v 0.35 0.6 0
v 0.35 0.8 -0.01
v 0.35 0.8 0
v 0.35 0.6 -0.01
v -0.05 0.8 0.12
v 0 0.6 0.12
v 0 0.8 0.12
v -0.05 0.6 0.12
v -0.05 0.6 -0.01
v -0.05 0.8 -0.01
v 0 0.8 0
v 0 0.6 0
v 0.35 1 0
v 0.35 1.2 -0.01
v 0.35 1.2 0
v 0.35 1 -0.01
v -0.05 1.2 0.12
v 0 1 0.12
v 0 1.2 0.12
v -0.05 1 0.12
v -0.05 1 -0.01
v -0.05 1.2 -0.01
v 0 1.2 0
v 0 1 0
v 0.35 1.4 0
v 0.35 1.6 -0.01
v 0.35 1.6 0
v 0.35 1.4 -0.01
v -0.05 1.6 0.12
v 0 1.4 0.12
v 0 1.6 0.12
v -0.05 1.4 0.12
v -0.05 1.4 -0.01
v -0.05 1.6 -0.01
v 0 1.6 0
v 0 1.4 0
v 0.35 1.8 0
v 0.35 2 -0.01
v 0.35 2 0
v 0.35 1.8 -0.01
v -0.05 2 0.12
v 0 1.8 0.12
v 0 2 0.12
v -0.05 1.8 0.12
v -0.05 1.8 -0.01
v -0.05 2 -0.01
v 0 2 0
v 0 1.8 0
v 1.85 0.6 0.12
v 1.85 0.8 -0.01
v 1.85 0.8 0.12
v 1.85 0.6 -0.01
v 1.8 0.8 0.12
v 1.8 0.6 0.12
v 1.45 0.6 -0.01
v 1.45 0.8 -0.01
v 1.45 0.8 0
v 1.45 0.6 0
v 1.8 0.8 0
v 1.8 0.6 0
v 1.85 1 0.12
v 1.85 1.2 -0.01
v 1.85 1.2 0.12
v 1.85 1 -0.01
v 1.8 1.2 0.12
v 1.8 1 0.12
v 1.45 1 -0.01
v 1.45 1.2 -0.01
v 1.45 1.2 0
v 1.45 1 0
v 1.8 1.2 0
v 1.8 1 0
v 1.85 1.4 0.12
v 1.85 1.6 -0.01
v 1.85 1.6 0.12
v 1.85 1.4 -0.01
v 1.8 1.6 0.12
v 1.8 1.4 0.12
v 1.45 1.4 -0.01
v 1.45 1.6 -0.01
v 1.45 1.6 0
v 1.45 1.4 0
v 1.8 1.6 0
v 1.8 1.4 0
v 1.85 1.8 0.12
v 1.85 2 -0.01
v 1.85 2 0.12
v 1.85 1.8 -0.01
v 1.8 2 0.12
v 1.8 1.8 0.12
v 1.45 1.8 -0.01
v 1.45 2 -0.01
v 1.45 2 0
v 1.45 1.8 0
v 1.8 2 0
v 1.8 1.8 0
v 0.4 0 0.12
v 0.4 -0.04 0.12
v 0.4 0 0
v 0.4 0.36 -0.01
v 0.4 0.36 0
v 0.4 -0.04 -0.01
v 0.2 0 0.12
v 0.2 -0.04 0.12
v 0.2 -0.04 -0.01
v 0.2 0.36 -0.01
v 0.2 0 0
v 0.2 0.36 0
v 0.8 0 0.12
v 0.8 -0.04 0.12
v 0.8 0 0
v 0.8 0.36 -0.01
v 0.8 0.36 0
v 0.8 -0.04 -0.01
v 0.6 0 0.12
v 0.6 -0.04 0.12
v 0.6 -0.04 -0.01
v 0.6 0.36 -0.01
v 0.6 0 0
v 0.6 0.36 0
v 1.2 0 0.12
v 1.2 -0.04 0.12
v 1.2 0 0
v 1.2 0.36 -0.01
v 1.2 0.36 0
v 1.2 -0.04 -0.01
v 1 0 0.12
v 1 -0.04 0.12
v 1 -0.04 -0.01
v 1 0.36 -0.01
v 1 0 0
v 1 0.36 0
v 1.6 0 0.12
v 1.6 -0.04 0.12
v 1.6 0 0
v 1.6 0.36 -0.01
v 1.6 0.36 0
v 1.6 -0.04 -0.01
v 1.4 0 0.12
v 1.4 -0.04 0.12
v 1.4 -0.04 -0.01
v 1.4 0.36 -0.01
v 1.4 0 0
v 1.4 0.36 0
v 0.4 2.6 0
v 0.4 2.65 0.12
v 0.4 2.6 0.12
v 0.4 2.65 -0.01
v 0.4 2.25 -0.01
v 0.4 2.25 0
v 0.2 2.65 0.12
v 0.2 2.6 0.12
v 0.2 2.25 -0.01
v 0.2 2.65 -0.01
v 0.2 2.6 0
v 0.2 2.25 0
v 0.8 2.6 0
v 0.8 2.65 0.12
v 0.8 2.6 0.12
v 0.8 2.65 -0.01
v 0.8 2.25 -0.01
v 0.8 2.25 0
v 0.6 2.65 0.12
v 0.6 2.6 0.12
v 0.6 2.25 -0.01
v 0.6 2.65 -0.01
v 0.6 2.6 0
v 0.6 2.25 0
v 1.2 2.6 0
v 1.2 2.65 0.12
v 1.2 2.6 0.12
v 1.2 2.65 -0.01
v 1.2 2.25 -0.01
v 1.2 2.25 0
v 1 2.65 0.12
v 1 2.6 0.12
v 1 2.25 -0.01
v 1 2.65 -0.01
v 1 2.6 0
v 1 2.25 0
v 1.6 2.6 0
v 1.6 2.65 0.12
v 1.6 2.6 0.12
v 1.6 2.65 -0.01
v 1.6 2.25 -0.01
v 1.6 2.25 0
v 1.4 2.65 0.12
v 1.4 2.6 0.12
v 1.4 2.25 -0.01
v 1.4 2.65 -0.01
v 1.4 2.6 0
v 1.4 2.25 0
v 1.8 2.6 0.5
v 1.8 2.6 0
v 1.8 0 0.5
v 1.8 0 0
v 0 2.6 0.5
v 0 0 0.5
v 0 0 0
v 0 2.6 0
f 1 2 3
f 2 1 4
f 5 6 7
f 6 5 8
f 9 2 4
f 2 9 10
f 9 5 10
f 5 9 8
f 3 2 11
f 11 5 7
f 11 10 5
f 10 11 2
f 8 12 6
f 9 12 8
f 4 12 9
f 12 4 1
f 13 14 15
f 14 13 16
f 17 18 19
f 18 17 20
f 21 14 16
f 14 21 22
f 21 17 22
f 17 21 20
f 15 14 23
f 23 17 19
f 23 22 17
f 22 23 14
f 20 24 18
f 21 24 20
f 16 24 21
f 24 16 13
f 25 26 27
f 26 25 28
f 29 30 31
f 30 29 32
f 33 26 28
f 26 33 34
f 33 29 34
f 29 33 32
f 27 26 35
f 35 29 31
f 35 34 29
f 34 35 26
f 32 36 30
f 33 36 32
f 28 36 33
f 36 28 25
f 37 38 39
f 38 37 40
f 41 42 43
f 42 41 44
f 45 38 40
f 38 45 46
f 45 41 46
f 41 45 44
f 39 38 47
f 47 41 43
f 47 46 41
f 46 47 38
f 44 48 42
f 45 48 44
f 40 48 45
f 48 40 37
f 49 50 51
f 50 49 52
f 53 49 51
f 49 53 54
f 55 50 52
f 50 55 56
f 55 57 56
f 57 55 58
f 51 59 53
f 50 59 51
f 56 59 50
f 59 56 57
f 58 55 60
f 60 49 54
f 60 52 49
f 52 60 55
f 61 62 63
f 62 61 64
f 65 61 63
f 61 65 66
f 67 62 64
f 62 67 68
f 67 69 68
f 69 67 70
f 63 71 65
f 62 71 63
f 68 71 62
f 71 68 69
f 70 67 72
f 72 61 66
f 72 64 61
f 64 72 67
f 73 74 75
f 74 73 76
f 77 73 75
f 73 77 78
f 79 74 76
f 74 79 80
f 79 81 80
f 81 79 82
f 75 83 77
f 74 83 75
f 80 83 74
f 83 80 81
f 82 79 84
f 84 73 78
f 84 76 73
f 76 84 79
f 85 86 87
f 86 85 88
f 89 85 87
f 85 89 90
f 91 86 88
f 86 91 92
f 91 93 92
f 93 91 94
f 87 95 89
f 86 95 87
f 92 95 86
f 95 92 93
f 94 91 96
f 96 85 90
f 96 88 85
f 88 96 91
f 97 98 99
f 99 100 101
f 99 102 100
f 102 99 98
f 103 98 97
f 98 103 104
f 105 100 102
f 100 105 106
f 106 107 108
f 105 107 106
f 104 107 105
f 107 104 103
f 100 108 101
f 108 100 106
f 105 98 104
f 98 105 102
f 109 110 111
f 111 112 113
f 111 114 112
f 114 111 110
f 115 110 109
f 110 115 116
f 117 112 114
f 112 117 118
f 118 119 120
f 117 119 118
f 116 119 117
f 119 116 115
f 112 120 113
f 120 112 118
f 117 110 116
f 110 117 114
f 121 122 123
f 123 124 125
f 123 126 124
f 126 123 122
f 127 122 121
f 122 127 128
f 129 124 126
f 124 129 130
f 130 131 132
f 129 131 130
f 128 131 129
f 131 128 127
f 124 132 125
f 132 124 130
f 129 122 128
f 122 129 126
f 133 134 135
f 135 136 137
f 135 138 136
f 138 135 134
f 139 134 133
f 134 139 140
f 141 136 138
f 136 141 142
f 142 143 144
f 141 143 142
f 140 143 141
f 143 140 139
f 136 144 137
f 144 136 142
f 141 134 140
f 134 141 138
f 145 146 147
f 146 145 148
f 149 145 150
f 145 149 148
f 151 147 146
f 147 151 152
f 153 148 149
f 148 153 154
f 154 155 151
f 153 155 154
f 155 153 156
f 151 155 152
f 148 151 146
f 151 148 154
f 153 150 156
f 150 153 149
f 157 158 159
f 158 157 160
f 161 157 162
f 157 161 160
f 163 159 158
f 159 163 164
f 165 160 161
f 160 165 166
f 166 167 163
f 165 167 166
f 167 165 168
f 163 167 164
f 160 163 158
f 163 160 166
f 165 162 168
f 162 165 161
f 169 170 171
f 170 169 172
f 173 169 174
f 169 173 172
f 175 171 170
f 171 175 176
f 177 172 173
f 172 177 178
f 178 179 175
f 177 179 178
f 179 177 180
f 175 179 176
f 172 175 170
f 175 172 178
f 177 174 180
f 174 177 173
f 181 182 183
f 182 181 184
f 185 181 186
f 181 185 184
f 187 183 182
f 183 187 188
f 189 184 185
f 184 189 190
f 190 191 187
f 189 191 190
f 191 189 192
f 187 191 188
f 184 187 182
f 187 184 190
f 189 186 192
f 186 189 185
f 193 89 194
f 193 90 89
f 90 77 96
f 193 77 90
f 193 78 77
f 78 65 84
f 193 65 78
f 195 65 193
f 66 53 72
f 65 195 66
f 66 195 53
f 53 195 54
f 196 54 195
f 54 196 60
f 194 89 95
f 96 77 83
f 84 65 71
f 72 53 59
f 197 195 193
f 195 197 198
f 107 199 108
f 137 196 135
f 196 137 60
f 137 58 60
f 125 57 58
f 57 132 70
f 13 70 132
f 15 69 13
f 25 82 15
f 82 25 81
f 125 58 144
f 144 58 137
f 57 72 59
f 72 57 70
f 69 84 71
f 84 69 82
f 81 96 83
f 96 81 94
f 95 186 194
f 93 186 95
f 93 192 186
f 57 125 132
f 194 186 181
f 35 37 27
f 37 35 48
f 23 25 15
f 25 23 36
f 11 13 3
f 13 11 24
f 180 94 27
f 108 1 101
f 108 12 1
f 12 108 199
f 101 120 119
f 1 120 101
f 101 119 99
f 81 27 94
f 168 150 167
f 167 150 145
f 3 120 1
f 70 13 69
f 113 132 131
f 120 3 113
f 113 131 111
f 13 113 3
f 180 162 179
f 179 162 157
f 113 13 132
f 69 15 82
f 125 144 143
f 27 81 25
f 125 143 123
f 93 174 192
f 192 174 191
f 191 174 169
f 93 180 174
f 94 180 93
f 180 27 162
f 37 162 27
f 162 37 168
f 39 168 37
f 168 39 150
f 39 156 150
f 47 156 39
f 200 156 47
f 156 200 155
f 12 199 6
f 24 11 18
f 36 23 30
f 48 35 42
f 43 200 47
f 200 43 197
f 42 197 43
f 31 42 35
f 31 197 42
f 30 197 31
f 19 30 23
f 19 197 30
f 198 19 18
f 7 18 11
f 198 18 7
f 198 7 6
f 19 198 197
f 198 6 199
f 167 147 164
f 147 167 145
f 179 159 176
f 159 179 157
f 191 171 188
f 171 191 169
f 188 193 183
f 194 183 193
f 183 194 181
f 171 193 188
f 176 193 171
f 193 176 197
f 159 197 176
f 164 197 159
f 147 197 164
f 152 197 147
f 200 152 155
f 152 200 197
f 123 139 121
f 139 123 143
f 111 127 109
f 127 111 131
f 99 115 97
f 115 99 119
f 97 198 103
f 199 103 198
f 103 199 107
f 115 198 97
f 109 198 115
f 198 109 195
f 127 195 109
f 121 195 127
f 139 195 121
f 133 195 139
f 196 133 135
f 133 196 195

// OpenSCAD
color("#505050") cube([1.8,2.6,0.5]);

translate([0.15, 2.6/2, 0.13/2-0.01]) {
    for (i=[-0.6:0.4:0.6]) {
        translate([0, i,0]) color("lightgray") cube([0.4,0.2,0.13], center=true);
    }
}

translate([0.15+1.5, 2.6/2, 0.13/2-0.01]) {
    for (i=[-0.6:0.4:0.6]) {
        translate([0, i,0]) color("lightgray") cube([0.4,0.2,0.13], center=true);
    }
}


translate([1.8/2,0.16, 0.13/2-0.01]) {
    for (i=[-0.6:0.4:0.6]) {
        translate([i, 0,0]) color("lightgray") cube([0.2,0.4,0.13], center=true);
    }
}

translate([1.8/2,2.45, 0.13/2-0.01]) {
    for (i=[-0.6:0.4:0.6]) {
        translate([i, 0,0]) color("lightgray") cube([0.2,0.4,0.13], center=true);
    }
}
